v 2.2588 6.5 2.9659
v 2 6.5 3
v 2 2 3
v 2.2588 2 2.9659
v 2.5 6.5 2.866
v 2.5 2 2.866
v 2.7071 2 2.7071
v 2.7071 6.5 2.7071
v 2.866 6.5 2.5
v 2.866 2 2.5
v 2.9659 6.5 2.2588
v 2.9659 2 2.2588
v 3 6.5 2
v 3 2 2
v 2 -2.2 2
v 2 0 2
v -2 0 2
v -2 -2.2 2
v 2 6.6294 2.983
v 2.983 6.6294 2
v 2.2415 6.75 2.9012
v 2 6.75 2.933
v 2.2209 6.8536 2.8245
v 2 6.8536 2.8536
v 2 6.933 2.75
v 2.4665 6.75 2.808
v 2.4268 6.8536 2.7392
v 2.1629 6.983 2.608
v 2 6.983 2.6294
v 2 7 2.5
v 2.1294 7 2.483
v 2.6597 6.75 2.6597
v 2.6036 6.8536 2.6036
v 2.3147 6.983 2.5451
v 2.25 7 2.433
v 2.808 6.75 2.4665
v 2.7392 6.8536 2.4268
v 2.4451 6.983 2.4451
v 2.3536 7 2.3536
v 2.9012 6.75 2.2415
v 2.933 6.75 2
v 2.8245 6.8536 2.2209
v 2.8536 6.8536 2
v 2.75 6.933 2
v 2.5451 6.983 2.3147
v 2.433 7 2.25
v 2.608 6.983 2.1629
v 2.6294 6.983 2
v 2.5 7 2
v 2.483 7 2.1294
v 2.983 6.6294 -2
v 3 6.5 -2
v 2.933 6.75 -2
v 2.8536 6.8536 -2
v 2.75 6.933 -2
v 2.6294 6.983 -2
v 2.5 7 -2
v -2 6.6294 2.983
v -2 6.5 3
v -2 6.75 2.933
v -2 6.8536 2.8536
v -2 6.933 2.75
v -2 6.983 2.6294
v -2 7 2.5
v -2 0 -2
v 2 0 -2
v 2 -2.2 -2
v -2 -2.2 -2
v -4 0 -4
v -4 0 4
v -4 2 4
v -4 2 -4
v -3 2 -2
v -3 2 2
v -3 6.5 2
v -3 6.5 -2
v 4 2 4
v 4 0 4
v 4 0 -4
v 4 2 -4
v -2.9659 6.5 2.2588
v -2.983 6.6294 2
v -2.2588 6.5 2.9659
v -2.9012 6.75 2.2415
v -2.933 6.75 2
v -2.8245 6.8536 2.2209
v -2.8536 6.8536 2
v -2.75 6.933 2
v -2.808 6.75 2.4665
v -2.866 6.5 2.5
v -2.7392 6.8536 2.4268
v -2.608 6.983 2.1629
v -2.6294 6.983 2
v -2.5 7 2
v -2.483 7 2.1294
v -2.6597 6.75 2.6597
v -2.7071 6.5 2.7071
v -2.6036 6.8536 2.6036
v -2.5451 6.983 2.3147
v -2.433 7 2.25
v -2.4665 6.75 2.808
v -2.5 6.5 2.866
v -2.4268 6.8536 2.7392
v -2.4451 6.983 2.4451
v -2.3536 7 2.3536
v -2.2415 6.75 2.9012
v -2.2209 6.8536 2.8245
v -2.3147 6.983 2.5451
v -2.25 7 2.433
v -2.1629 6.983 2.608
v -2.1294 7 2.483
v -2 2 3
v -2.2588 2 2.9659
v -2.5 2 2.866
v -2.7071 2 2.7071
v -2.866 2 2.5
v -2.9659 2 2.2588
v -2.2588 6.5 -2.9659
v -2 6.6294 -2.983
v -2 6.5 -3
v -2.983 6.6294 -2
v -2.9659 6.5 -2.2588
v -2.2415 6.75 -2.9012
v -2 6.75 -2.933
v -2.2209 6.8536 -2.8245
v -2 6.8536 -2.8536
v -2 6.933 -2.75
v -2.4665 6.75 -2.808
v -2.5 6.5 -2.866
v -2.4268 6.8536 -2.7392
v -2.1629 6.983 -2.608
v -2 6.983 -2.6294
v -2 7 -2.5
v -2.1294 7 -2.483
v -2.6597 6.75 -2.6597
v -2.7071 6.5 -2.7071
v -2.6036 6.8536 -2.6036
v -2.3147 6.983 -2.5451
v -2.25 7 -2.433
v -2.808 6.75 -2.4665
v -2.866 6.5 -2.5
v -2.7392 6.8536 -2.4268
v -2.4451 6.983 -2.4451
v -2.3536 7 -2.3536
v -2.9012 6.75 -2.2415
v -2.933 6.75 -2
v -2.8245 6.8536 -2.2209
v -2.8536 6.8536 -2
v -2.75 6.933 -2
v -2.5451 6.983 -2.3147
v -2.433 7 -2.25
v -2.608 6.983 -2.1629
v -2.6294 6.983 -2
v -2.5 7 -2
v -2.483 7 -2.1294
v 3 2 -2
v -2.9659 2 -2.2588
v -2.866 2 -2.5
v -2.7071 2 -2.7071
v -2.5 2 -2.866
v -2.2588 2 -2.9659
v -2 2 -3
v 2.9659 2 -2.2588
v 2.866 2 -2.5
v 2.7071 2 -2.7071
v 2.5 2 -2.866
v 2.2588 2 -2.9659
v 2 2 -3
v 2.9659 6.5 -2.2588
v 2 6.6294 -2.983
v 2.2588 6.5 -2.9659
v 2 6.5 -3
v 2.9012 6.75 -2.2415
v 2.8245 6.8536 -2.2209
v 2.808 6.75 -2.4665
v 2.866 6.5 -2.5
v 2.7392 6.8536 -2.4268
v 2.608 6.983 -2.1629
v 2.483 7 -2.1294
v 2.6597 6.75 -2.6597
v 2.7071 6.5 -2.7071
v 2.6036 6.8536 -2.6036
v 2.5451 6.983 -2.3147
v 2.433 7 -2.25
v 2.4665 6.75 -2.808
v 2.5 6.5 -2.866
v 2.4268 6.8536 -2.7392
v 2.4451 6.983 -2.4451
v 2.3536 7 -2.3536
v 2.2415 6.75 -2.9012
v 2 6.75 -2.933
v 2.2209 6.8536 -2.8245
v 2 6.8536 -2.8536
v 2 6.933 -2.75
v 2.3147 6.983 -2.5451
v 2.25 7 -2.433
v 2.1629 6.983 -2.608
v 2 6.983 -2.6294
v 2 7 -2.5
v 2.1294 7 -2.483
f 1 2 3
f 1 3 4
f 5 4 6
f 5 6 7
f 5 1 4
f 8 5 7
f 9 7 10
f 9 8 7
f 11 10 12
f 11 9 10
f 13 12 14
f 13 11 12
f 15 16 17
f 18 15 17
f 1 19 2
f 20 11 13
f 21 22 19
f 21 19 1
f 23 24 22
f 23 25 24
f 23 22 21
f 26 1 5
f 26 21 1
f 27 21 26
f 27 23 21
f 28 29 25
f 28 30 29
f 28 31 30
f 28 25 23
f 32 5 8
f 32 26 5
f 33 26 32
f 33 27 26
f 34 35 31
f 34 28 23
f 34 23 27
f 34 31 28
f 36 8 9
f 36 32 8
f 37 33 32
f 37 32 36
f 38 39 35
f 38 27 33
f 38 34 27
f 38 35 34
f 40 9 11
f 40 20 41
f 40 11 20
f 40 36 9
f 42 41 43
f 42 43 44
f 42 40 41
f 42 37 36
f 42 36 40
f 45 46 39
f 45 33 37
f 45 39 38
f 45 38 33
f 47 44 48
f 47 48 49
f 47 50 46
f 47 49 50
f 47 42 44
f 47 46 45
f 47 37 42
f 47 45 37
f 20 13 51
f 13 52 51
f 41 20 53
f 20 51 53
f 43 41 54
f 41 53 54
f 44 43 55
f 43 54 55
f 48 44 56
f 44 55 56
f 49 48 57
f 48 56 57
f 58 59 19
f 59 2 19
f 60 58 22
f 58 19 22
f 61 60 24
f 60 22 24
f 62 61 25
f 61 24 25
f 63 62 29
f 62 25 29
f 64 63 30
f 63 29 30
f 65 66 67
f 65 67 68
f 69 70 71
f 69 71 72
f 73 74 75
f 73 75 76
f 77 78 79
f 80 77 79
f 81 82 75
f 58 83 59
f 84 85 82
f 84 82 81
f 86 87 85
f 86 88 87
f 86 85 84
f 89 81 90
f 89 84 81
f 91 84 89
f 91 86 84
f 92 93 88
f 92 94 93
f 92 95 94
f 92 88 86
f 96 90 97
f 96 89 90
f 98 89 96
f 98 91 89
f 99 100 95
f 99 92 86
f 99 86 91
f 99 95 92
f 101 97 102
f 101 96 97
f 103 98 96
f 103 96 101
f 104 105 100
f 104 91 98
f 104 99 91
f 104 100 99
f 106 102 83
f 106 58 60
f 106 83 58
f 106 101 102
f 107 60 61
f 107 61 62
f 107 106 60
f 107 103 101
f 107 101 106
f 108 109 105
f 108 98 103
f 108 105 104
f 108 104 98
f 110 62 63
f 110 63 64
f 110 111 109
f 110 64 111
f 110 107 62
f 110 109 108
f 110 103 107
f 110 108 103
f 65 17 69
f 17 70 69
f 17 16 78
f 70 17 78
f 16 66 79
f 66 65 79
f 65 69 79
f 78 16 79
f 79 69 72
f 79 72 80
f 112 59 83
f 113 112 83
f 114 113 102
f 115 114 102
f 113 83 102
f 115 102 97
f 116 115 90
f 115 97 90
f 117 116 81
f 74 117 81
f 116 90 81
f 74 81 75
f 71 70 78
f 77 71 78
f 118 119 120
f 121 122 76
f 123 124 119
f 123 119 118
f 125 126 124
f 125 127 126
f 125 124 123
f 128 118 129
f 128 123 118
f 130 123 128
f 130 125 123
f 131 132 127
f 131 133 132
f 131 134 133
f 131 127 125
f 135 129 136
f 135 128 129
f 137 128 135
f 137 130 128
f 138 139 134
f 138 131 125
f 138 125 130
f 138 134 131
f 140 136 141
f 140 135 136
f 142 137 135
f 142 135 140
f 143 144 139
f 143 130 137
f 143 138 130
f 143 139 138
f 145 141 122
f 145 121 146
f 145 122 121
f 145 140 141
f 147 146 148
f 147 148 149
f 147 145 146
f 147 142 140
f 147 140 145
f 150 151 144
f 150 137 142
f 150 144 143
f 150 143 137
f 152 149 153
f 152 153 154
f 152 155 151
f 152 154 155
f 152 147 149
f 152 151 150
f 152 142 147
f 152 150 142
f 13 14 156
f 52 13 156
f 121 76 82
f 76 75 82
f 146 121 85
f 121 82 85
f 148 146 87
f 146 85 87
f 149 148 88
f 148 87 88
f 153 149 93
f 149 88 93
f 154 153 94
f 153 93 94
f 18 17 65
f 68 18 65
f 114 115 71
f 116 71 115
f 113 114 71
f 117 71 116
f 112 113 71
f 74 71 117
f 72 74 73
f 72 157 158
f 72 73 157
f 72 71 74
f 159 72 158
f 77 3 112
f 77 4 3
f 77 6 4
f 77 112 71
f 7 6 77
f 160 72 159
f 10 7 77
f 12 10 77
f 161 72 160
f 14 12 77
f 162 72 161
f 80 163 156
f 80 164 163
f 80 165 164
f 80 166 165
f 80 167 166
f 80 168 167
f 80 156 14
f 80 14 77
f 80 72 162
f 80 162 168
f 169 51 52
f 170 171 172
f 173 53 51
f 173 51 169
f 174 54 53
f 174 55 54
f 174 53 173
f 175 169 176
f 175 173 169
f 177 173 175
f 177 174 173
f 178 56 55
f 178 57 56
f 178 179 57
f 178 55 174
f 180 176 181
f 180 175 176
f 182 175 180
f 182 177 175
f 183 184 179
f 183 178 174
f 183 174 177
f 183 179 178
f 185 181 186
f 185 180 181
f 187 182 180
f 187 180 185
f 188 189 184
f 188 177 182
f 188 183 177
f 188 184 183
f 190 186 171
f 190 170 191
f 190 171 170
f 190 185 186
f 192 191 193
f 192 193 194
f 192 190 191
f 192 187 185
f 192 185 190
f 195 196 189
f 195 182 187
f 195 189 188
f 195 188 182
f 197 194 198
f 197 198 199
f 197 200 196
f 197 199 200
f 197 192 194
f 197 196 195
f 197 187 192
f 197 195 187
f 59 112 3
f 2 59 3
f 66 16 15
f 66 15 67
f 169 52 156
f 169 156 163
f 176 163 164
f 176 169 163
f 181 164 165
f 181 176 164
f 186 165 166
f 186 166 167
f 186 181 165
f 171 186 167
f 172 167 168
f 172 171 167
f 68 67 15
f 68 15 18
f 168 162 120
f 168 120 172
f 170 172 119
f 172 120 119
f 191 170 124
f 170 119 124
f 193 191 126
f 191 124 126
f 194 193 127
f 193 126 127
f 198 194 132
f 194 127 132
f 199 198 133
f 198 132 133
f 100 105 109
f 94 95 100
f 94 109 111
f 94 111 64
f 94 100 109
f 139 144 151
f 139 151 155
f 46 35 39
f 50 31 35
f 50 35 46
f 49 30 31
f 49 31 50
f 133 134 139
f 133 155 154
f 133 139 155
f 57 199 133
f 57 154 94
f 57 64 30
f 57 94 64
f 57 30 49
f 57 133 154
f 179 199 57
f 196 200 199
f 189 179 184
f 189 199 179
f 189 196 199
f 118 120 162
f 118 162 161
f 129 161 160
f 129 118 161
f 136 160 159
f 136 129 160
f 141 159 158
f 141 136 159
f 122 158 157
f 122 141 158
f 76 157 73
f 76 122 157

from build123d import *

# Parameters (mm, degrees)
SKETCH1_W           = 8
SKETCH1_H           = 8
BOSS_EXTRUDE1_DEPTH = 2
SKETCH2_W           = 6
SKETCH2_H           = 6
BOSS_EXTRUDE2_DEPTH = 5
FILLET1_R           = 1
SKETCH3_W           = 4
SKETCH3_H           = 4
BOSS_EXTRUDE3_DEPTH = 2.2
FILLET2_R           = 0.5


with BuildPart() as part:
    # Sketch1 → Boss-Extrude1 (new body)
    with BuildSketch(Plane(origin=(0, 0, 0), x_dir=(1, 0, 0), z_dir=(0, 1, 0))):
        Rectangle(SKETCH1_W, SKETCH1_H)
    extrude(amount=BOSS_EXTRUDE1_DEPTH)

    # Sketch2 → Boss-Extrude2 (add)
    with BuildSketch(Plane(origin=(0, 2, 0), x_dir=(1, 0, 0), z_dir=(0, 1, 0))):
        Rectangle(SKETCH2_W, SKETCH2_H)
    extrude(amount=BOSS_EXTRUDE2_DEPTH)

    # Fillet1
    fillet1_edges = [part.edges().sort_by_distance(p)[0] for p in [
        (3, 4.5, 3),
        (3, 4.5, -3),
        (-3, 4.5, -3),
        (-3, 4.5, 3),
    ]]
    fillet(fillet1_edges, radius=FILLET1_R)

    # Sketch3 → Boss-Extrude3 (add)
    with BuildSketch(Plane(origin=(0, 0, 0), x_dir=(-1, 0, 0), z_dir=(0, -1, 0))):
        Rectangle(SKETCH3_W, SKETCH3_H)
    extrude(amount=BOSS_EXTRUDE3_DEPTH)

    # Fillet2
    fillet2_edges = [part.edges().sort_by_distance(p)[0] for p in [
        (3, 7, 0),
        (0, 7, 3),
        (0, 7, -3),
        (-3, 7, 0),
        (-2.707106781, 7, -2.707106781),
        (-2.707106781, 7, 2.707106781),
        (2.707106781, 7, -2.707106781),
        (2.707106781, 7, 2.707106781),
    ]]
    fillet(fillet2_edges, radius=FILLET2_R)


solid = part.part
